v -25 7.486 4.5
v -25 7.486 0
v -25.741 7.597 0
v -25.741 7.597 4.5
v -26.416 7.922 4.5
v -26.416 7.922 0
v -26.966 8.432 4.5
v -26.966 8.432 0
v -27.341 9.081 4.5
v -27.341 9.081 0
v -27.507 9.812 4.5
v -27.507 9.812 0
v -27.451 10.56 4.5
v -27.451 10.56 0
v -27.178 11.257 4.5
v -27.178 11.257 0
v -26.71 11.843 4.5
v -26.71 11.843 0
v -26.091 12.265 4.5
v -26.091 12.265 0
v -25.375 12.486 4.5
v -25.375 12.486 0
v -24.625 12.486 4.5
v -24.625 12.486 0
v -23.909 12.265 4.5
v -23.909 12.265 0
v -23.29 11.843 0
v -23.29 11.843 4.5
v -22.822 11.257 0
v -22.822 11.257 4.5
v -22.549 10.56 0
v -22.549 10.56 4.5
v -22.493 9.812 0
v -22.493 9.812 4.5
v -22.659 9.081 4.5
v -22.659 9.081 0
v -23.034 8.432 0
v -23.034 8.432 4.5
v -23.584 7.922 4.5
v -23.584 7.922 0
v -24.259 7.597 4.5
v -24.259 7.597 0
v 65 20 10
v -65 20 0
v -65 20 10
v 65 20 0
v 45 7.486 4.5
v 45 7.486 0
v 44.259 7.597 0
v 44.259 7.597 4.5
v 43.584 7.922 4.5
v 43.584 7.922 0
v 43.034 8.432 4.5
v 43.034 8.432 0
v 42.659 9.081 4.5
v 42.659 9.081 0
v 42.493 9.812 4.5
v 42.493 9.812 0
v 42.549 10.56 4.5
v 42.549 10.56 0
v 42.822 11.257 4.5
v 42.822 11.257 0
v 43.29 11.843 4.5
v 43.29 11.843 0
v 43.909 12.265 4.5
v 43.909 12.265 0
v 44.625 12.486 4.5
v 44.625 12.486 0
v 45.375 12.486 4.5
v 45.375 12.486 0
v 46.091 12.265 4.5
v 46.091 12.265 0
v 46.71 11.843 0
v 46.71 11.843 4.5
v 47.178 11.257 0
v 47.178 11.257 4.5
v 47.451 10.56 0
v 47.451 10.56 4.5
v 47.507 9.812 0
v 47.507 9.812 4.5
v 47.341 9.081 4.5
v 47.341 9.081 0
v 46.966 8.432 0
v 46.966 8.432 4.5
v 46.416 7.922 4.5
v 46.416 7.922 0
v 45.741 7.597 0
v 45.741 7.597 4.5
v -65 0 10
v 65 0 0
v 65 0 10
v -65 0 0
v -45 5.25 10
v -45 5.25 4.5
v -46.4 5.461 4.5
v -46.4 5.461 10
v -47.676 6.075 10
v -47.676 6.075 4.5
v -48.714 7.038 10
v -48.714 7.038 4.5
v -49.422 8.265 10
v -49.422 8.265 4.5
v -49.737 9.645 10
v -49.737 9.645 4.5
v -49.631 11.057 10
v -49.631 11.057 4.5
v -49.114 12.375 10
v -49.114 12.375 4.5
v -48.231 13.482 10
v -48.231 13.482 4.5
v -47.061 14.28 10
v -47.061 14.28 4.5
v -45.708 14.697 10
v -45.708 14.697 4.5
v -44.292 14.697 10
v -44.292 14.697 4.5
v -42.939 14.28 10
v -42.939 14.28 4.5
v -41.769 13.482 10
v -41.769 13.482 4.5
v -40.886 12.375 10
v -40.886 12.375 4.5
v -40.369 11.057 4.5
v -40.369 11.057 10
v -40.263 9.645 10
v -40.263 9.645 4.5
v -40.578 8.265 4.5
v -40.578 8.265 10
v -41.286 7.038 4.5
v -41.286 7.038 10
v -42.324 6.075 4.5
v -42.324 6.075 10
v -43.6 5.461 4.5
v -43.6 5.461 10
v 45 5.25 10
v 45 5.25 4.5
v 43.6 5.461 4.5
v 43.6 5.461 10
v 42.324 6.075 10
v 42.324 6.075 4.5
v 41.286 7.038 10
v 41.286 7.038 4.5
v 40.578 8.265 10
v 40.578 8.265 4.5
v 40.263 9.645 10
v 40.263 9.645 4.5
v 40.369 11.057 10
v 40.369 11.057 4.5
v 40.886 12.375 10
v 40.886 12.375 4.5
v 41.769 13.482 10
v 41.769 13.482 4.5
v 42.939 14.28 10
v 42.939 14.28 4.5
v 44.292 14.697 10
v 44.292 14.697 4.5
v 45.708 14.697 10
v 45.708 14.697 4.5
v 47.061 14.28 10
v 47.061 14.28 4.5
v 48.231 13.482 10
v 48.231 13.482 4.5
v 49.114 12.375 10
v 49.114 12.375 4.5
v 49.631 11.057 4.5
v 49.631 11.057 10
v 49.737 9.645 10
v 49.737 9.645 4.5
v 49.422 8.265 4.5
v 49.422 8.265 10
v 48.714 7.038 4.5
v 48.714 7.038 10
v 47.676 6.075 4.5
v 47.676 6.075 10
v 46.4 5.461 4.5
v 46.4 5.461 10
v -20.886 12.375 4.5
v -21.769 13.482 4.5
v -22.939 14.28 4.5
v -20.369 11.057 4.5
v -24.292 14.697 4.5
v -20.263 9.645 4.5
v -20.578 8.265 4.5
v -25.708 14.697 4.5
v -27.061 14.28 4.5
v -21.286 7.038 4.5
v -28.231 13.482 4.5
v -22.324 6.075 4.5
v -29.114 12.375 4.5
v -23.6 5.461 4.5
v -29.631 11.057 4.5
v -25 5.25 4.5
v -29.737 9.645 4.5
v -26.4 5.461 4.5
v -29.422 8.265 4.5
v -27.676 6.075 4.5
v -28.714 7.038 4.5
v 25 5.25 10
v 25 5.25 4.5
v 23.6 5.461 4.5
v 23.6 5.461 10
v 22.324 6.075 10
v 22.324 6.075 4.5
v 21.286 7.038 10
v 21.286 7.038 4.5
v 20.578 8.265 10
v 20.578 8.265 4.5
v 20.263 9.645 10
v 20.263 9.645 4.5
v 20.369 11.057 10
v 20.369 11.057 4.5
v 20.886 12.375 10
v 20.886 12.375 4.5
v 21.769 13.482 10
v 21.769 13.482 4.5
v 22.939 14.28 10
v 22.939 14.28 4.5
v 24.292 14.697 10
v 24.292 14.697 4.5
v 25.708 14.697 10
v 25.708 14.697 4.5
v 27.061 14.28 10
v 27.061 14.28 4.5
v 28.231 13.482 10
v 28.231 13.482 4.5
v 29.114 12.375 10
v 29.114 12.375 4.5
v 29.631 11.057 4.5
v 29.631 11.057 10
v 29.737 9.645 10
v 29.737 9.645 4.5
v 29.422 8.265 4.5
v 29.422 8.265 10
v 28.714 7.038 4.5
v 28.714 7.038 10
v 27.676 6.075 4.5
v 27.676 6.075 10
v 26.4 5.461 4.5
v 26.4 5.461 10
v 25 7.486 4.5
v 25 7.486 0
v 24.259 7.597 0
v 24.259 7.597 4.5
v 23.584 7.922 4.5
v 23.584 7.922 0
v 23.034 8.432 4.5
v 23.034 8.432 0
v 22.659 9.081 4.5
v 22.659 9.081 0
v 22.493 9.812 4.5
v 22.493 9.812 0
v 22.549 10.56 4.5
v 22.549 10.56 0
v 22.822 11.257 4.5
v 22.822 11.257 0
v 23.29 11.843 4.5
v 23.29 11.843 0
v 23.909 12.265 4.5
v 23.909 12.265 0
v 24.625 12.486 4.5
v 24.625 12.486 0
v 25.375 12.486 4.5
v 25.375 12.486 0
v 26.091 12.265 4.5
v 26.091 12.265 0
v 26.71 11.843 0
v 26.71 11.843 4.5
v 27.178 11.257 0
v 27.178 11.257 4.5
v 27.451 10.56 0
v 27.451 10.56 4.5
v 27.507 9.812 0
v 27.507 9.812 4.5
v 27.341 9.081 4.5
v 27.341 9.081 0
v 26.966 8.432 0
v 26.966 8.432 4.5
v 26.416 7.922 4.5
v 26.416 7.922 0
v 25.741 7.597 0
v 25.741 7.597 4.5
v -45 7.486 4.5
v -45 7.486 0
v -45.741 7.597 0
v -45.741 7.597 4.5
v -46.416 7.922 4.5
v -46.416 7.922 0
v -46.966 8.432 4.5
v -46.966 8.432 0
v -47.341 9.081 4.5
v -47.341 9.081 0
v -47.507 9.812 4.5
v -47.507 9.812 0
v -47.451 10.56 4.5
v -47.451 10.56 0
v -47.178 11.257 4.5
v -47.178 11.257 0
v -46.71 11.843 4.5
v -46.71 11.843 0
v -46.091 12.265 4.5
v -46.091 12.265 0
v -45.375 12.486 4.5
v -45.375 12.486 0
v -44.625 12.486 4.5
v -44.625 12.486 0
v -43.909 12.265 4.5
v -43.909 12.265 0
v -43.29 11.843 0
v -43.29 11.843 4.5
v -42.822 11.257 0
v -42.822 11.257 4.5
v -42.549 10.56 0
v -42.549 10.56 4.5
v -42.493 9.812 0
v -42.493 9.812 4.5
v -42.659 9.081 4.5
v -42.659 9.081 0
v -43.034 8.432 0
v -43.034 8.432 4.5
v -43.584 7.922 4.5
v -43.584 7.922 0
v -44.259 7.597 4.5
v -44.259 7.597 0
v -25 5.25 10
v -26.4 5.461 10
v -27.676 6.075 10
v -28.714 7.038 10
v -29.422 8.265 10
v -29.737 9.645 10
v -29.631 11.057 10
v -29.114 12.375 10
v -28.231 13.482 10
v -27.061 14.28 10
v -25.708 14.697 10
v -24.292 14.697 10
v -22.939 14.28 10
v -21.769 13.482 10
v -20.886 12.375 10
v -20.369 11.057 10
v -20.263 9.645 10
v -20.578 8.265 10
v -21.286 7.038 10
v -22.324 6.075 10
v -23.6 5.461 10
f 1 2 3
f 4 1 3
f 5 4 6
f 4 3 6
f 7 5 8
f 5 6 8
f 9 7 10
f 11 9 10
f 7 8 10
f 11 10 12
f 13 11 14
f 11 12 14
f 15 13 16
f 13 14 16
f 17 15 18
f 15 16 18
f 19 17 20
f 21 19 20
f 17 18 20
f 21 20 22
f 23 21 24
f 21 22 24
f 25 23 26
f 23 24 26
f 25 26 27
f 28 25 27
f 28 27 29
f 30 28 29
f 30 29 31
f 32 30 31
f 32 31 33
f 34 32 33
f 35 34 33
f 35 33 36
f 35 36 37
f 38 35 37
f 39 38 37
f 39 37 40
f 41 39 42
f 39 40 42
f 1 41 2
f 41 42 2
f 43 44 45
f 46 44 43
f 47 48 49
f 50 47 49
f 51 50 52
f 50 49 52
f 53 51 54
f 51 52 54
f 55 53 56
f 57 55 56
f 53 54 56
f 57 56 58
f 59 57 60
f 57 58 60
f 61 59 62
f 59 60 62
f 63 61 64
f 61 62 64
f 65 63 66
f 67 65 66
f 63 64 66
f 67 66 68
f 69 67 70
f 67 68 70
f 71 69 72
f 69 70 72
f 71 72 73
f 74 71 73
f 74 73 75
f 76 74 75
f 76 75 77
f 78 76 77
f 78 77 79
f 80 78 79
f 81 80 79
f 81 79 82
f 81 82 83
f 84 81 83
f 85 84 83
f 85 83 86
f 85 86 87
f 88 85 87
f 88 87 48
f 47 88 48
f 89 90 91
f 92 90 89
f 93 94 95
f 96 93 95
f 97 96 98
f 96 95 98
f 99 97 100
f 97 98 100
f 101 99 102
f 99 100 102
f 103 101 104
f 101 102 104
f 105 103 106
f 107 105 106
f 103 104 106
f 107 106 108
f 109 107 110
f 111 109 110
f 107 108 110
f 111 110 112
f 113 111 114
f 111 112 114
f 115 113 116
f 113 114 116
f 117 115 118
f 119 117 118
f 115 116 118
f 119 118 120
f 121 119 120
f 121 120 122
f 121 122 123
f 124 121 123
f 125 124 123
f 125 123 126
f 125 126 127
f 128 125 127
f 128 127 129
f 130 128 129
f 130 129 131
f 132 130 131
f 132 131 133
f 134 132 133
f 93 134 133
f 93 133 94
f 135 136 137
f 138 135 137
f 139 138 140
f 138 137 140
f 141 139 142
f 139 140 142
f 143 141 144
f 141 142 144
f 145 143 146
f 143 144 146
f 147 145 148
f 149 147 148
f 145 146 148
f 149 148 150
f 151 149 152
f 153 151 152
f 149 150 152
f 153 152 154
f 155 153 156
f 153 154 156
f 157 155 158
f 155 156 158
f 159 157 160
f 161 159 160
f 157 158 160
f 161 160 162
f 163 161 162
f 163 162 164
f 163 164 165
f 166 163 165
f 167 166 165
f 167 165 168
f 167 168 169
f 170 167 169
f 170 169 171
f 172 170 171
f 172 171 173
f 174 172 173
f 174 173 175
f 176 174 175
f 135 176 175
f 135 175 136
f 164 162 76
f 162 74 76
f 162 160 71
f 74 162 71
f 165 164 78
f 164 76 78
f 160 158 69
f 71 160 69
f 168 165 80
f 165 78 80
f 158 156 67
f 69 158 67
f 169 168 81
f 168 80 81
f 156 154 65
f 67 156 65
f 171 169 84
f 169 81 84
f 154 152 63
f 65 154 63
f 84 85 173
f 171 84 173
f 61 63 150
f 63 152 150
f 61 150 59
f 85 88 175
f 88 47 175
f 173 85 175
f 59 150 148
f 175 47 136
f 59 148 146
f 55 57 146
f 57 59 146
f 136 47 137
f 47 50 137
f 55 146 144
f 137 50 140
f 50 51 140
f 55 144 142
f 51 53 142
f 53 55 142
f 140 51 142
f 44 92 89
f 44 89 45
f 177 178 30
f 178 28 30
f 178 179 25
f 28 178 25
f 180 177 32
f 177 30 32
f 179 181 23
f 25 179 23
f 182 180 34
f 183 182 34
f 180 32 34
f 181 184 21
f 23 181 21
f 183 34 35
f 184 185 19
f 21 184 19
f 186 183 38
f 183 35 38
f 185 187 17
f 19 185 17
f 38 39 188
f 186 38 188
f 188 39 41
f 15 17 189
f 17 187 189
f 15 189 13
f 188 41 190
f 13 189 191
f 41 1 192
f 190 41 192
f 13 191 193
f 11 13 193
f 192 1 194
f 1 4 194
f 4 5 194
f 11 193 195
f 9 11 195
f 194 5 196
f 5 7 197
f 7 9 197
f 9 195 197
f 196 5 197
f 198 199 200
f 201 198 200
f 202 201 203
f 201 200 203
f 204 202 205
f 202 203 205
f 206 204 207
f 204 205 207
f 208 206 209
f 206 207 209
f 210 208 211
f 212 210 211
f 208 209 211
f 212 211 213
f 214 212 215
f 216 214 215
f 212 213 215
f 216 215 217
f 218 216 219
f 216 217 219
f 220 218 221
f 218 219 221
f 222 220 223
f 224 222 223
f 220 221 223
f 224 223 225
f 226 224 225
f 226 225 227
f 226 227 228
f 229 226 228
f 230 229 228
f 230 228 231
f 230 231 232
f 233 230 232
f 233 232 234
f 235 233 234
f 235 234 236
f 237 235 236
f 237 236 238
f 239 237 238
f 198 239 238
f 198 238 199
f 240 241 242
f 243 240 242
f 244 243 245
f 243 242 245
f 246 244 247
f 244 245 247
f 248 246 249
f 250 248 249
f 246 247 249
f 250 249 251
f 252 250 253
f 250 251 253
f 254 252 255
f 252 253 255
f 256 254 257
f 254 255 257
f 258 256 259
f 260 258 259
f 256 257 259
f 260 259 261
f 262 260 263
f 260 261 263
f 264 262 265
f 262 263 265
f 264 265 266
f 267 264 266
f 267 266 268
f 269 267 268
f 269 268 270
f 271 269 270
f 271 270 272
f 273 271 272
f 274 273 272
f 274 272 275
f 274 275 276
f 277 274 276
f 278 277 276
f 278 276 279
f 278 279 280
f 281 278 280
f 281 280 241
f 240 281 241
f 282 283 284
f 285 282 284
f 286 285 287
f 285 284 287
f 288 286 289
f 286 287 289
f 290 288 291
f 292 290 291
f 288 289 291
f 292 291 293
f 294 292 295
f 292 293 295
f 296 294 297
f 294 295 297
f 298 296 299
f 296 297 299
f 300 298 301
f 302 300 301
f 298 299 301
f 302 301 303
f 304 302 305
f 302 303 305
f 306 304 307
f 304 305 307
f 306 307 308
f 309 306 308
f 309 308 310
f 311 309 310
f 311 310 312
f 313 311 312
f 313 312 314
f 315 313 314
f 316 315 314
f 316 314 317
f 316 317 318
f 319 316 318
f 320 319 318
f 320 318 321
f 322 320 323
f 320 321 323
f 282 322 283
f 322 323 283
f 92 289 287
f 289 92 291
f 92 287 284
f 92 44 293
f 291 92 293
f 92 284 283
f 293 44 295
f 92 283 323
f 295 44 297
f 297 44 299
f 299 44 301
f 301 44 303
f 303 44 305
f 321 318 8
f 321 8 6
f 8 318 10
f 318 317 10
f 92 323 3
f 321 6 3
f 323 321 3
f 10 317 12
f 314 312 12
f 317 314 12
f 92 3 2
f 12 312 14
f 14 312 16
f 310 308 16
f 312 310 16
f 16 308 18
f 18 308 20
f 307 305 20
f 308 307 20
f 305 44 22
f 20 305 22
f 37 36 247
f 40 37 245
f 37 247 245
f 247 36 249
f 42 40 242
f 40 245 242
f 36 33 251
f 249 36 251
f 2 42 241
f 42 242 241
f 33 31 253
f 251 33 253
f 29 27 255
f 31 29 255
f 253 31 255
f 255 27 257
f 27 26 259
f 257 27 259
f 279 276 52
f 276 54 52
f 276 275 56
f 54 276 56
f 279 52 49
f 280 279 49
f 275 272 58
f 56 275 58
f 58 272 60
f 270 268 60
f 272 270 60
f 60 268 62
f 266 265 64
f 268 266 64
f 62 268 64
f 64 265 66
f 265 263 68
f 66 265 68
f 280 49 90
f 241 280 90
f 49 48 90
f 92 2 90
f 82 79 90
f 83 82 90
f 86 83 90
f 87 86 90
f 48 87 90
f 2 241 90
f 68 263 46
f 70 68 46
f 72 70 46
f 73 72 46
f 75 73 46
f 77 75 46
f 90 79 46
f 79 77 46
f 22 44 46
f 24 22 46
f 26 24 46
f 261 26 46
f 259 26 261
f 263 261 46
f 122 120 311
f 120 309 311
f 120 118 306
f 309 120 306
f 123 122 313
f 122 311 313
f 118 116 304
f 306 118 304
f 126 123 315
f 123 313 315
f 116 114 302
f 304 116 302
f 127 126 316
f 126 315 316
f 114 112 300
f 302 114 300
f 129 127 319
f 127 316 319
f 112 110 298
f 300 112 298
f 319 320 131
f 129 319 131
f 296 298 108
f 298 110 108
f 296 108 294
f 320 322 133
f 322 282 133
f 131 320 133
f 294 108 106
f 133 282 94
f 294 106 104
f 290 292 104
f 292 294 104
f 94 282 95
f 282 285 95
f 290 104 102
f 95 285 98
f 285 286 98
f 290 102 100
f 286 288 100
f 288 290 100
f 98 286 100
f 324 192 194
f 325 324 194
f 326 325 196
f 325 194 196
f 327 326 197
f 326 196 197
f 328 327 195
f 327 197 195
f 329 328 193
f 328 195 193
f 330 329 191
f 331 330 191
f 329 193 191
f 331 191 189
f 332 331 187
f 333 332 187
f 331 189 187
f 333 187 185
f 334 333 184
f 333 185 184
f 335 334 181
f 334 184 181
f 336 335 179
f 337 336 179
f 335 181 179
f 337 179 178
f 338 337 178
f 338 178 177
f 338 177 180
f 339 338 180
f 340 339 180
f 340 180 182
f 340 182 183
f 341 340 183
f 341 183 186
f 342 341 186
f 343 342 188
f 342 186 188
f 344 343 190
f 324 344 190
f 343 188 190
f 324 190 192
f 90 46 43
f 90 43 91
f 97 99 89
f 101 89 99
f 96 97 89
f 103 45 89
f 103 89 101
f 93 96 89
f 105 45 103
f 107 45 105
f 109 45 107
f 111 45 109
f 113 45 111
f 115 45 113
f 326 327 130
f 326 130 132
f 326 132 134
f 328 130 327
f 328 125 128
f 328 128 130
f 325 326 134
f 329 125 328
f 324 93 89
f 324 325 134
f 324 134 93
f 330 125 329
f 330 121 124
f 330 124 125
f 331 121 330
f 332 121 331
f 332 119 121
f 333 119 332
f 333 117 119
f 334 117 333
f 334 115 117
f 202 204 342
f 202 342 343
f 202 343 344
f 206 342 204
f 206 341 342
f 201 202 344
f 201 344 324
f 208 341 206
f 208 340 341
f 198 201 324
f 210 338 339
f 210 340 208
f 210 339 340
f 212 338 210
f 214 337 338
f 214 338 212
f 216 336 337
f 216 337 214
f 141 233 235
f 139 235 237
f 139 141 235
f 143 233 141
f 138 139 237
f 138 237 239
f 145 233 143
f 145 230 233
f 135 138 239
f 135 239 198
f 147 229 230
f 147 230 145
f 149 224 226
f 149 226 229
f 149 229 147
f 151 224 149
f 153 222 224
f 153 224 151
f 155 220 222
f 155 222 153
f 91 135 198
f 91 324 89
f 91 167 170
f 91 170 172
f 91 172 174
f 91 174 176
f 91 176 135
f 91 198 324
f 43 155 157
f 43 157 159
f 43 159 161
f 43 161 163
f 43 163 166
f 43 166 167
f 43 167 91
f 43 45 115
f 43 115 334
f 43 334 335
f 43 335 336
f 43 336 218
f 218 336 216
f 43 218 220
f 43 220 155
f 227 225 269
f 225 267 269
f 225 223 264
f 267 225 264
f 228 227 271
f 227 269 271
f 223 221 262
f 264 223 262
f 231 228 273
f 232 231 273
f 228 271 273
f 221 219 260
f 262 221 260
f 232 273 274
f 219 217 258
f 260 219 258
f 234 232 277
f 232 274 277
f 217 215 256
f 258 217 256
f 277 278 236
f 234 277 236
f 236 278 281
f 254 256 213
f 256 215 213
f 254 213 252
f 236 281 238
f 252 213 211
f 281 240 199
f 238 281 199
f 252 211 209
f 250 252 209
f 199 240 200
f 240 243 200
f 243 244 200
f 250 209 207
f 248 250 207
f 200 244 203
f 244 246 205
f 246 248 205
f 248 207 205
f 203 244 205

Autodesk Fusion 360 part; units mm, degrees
sketch "Sketch1" plane through (0, 0, 0) normal (0, 0, 1) x (1, 0, 0)
  line L0 (-65, 20) -> (65, 20)
  line L1 (65, 20) -> (65, 0)
  line L2 (65, 0) -> (-65, 0)
  line L3 (-65, 0) -> (-65, 20)
  dimension "d1" = 130
  dimension "d2" = 20
extrude "Extrude1" add sketch "Sketch1" along normal blind 10
sketch "Sketch3" plane through (0, 0, 10) normal (0, 0, 1) x (-1, 0, 0)
  line L0 (65, -20) -> (65, 0)
  line L1 (65, -10) -> (45, -10)
  line L2 (45, -10) -> (25, -10)
  line L3 (-65, 0) -> (-65, -20)
  line L4 (-65, -10) -> (-45, -10)
  line L5 (-45, -10) -> (-25, -10)
  point P0 (65, -20)
  dimension "d10" = 20
  dimension "d11" = 20
  dimension "d12" = 20
  dimension "d13" = 20
hole "Hole1" at (-45, 10, 10) at (25, 10, 10) at (45, 10, 10) at (-25, 10, 10) direction (0, 0, -1) diameter 5.029 depth 11 tip angle 118 counterbore diameter 9.5 counterbore depth 5.5
